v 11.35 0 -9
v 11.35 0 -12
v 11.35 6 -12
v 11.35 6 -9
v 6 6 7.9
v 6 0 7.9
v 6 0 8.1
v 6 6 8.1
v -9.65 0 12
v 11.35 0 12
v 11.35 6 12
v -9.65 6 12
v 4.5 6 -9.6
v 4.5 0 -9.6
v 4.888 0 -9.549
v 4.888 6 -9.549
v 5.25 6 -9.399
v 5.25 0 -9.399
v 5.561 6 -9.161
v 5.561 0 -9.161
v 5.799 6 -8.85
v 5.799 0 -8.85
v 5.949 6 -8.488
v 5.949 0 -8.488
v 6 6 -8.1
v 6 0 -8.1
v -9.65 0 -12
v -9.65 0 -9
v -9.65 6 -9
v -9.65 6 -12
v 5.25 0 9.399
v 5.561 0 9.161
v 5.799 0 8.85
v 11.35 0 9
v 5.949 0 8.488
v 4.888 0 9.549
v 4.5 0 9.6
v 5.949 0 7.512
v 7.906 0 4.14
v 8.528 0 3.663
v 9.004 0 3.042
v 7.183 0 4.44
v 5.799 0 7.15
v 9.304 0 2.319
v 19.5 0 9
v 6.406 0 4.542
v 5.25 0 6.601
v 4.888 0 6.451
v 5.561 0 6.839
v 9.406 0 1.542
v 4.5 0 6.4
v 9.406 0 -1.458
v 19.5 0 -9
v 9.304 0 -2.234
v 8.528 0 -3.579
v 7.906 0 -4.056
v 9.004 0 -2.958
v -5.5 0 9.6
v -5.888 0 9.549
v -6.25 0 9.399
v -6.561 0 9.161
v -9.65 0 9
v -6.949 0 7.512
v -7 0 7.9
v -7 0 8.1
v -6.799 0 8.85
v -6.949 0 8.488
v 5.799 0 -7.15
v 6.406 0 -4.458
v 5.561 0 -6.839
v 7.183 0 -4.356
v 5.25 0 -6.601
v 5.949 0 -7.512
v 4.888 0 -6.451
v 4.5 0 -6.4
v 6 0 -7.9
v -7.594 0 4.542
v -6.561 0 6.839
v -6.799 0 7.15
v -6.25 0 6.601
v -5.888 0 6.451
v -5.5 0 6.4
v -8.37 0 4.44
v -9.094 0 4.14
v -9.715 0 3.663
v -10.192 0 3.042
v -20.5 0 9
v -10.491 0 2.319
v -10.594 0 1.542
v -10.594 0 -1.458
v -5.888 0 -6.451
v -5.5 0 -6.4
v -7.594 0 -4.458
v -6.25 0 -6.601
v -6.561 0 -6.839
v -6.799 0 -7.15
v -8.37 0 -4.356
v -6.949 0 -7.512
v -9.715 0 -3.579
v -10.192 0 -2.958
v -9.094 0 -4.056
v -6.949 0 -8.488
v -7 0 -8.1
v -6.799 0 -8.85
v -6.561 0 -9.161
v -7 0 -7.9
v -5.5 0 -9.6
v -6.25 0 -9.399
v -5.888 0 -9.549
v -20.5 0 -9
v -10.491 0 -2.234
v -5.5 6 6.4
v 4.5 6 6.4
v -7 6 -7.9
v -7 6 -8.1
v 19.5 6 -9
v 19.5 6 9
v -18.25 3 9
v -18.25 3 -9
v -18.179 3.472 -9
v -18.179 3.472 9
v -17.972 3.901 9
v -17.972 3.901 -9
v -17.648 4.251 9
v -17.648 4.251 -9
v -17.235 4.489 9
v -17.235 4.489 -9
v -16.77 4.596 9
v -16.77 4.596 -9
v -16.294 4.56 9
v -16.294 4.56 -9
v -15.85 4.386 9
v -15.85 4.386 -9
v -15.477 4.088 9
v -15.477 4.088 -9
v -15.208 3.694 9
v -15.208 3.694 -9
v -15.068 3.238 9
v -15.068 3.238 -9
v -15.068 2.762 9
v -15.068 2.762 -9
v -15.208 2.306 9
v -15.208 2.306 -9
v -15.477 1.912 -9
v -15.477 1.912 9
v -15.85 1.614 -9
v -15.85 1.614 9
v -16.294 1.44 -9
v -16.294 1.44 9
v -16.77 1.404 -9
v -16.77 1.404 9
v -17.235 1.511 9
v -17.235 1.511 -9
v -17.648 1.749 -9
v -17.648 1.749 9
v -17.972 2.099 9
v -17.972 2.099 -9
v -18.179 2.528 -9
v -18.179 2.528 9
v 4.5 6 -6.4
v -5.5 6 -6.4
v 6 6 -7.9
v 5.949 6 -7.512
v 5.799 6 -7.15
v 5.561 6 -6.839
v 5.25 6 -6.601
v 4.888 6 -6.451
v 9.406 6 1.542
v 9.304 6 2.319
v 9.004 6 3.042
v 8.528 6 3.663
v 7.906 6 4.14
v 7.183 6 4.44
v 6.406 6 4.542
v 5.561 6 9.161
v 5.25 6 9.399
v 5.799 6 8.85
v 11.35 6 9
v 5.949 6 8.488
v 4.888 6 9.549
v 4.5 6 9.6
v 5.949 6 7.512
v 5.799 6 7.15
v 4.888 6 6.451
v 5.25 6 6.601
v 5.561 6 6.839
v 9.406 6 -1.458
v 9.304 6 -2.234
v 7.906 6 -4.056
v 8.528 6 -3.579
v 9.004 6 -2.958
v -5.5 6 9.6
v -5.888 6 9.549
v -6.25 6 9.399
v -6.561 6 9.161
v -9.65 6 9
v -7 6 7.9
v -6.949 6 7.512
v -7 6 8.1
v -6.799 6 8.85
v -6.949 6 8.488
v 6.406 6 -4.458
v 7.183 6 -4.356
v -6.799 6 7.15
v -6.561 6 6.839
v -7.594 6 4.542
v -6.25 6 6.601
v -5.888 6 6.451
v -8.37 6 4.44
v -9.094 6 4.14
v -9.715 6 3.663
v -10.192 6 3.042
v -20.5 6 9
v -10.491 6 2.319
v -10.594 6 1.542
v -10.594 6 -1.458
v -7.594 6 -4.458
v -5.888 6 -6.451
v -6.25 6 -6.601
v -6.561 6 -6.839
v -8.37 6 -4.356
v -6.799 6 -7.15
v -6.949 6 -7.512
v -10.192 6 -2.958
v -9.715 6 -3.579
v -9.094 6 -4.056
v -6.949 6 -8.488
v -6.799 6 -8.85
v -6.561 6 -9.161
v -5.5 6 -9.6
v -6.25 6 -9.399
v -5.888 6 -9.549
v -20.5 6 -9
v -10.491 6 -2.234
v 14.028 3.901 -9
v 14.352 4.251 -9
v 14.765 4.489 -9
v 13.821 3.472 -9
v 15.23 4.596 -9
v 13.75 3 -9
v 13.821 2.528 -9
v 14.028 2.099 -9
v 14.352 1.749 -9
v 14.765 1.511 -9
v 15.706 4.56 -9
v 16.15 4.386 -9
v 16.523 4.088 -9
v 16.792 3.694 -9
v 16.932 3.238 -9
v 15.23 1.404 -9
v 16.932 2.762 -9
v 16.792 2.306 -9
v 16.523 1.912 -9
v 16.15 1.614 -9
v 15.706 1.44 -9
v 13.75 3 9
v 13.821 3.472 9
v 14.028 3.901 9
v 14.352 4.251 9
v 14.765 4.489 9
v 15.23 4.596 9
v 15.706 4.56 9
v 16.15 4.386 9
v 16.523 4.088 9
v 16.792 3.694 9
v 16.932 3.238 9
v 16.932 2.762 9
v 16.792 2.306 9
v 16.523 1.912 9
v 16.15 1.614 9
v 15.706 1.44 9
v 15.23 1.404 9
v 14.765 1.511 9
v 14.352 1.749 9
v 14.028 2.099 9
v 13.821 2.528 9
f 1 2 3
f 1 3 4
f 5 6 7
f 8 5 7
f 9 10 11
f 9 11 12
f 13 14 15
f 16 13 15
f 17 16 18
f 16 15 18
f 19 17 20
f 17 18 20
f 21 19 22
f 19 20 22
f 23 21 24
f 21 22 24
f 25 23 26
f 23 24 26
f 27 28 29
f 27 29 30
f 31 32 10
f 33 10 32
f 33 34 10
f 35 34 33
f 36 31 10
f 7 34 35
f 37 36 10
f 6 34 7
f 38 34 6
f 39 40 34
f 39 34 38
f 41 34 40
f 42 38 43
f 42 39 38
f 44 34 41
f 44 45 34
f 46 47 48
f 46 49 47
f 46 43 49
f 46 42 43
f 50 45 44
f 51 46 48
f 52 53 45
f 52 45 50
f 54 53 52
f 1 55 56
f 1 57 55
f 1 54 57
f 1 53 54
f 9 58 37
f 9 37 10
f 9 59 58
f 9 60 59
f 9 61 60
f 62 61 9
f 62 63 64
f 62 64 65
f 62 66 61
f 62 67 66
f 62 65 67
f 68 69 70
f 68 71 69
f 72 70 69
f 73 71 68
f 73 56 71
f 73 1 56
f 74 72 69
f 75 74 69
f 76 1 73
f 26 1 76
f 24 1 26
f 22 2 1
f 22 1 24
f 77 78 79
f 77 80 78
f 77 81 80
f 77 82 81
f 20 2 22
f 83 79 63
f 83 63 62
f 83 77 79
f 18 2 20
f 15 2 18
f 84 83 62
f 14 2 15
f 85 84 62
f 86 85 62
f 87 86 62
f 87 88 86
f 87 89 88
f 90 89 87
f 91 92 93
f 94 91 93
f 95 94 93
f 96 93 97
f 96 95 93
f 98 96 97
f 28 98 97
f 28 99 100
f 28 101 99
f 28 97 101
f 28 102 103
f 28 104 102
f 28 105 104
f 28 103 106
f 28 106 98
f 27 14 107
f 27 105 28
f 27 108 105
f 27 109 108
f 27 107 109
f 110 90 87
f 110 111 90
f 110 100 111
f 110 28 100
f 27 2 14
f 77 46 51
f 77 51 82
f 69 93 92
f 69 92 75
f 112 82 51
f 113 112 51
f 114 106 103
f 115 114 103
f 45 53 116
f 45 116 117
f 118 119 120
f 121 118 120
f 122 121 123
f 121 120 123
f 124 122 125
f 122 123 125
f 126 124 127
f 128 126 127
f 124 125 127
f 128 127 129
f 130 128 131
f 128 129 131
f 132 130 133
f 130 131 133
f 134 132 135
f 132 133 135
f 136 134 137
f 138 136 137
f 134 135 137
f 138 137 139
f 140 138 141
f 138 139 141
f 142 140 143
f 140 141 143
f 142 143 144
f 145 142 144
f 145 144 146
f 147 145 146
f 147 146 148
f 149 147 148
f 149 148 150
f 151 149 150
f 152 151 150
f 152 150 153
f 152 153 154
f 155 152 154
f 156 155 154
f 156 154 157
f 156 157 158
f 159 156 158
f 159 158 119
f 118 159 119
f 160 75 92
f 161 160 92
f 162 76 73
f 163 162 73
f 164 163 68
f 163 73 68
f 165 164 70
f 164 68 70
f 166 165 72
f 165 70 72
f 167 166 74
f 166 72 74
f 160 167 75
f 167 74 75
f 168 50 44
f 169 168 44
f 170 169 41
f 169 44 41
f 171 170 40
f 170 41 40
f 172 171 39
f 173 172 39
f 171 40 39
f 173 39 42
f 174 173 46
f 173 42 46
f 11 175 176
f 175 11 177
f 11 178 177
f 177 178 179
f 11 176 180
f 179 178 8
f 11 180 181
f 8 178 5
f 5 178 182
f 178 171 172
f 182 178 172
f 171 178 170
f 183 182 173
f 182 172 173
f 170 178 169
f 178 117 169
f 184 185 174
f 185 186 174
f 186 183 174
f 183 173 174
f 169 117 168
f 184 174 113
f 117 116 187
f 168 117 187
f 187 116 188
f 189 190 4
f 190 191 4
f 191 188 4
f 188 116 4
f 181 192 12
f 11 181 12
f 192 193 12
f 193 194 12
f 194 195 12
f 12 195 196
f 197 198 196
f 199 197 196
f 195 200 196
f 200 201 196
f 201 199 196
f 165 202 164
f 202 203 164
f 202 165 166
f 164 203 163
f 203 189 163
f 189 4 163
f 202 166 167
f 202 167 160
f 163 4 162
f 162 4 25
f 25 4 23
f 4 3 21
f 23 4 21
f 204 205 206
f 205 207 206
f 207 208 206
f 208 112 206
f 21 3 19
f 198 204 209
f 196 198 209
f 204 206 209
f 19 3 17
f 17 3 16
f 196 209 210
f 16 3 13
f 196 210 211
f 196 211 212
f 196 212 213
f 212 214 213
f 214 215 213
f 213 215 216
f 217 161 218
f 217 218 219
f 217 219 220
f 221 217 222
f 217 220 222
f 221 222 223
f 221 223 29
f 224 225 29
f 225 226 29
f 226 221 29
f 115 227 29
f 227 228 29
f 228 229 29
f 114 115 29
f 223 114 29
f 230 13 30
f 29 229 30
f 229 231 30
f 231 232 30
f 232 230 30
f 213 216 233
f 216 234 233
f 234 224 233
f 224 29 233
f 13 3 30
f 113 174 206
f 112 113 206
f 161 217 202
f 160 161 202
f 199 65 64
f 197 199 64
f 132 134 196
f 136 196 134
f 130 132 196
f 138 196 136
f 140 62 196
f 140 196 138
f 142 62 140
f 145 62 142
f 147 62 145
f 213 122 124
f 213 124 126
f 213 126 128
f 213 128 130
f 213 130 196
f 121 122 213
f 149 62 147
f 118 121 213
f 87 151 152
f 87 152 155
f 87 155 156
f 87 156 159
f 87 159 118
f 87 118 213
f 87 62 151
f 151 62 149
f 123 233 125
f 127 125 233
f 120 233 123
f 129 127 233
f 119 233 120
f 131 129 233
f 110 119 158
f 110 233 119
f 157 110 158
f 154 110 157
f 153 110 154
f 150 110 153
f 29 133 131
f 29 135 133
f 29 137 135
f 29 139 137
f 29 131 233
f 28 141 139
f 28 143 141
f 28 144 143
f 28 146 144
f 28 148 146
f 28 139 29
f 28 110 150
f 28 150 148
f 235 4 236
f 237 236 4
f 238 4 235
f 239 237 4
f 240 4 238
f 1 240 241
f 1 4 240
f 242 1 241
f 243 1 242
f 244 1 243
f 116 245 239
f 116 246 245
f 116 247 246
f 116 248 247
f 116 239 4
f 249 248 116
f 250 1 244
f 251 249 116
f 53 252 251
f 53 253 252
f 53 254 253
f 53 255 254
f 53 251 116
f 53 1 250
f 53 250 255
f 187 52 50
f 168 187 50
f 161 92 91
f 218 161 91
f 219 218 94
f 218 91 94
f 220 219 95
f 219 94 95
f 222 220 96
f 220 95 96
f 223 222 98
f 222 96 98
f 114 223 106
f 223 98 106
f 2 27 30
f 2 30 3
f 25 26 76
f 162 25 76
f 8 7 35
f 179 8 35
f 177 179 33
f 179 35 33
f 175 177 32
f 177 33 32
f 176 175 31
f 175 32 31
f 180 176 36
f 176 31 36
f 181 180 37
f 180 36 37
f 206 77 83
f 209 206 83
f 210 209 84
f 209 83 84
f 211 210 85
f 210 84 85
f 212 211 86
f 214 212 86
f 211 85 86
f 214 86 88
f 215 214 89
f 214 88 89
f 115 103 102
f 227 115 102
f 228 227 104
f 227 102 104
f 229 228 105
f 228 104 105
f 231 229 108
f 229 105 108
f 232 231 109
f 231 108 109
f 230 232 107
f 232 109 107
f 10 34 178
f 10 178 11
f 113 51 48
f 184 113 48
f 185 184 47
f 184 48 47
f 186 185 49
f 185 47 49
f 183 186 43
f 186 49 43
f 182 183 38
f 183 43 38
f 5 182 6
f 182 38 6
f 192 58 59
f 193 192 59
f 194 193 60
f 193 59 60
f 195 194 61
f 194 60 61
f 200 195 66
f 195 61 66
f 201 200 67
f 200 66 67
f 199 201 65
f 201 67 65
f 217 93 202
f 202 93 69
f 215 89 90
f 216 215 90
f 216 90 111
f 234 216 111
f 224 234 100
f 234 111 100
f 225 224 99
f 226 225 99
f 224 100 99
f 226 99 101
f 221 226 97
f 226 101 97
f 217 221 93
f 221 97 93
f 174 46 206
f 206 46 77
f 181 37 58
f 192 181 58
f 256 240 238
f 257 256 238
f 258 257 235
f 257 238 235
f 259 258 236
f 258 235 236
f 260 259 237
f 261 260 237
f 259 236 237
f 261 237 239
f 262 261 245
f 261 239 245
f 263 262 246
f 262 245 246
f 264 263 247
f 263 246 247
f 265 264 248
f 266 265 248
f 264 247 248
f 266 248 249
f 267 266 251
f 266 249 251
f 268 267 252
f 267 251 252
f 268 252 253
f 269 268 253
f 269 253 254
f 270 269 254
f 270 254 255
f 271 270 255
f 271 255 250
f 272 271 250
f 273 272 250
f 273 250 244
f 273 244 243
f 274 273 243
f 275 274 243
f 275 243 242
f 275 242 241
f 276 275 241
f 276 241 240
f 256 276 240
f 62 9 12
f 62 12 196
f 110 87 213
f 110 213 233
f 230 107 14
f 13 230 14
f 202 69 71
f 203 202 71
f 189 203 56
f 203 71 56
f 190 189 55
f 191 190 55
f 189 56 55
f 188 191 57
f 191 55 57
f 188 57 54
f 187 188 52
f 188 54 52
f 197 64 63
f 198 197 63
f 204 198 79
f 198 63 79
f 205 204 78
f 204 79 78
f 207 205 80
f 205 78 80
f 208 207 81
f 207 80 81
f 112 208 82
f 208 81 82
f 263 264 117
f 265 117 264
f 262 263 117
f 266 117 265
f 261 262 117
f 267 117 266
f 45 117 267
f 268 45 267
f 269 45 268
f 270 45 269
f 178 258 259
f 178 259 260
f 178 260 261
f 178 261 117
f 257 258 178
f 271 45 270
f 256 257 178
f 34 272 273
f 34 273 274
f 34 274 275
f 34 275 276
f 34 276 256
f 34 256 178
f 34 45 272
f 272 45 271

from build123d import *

# Parameters (mm, degrees)
EXTRUDE_1_DEPTH     = 6
SKETCH_2_R          = 1.6
CUT_EXTRUDE_1_DEPTH = 22


with BuildPart() as part:
    # Эскиз1 → Бобышка-Вытянуть1 (new body)
    with BuildSketch(Plane(origin=(0, 0, 0), x_dir=(1, 0, 0), z_dir=(0, 1, 0))):
        Polygon((-9.65, 9), (-9.65, 12), (11.35, 12), (11.35, 9), (19.5, 9), (19.5, -9), (11.35, -9), (11.35, -12), (-9.65, -12), (-9.65, -9), (-20.5, -9), (-20.5, 9), align=None)
        with BuildLine():
            Line((6.406364979, -4.542135759), (-7.593635021, -4.542135759))
            ThreePointArc((-7.593635021, -4.542135759), (-9.714955364, -3.663456103), (-10.593635021, -1.542135759))
            Line((-10.593635021, -1.542135759), (-10.593635021, 1.457864241))
            ThreePointArc((-10.593635021, 1.457864241), (-9.714955364, 3.579184584), (-7.593635021, 4.457864241))
            Line((-7.593635021, 4.457864241), (6.406364979, 4.457864241))
            ThreePointArc((6.406364979, 4.457864241), (8.527685323, 3.579184584), (9.406364979, 1.457864241))
            Line((9.406364979, 1.457864241), (9.406364979, -1.542135759))
            ThreePointArc((9.406364979, -1.542135759), (8.527685323, -3.663456103), (6.406364979, -4.542135759))
        make_face(mode=Mode.SUBTRACT)
        with BuildLine():
            Line((4.5, 6.4), (-5.5, 6.4))
            ThreePointArc((-5.5, 6.4), (-6.560660172, 6.839339828), (-7, 7.9))
            Line((-7, 7.9), (-7, 8.1))
            ThreePointArc((-7, 8.1), (-6.560660172, 9.160660172), (-5.5, 9.6))
            Line((-5.5, 9.6), (4.5, 9.6))
            ThreePointArc((4.5, 9.6), (5.560660172, 9.160660172), (6, 8.1))
            Line((6, 8.1), (6, 7.9))
            ThreePointArc((6, 7.9), (5.560660172, 6.839339828), (4.5, 6.4))
        make_face(mode=Mode.SUBTRACT)
        with BuildLine():
            Line((4.5, -9.6), (-5.5, -9.6))
            ThreePointArc((-5.5, -9.6), (-6.560660172, -9.160660172), (-7, -8.1))
            Line((-7, -8.1), (-7, -7.9))
            ThreePointArc((-7, -7.9), (-6.560660172, -6.839339828), (-5.5, -6.4))
            Line((-5.5, -6.4), (4.5, -6.4))
            ThreePointArc((4.5, -6.4), (5.560660172, -6.839339828), (6, -7.9))
            Line((6, -7.9), (6, -8.1))
            ThreePointArc((6, -8.1), (5.560660172, -9.160660172), (4.5, -9.6))
        make_face(mode=Mode.SUBTRACT)
    extrude(amount=EXTRUDE_1_DEPTH)

    # Эскиз2 → Вырез-Вытянуть1 (cut, through all)
    with BuildSketch(Plane(origin=(0, 0, -9), x_dir=(-1, 0, 0), z_dir=(0, 0, -1))):
        with Locations((-15.35, 3)):
            Circle(SKETCH_2_R)
        with Locations((16.65, 3)):
            Circle(SKETCH_2_R)
    extrude(amount=-CUT_EXTRUDE_1_DEPTH, mode=Mode.SUBTRACT)


solid = part.part
